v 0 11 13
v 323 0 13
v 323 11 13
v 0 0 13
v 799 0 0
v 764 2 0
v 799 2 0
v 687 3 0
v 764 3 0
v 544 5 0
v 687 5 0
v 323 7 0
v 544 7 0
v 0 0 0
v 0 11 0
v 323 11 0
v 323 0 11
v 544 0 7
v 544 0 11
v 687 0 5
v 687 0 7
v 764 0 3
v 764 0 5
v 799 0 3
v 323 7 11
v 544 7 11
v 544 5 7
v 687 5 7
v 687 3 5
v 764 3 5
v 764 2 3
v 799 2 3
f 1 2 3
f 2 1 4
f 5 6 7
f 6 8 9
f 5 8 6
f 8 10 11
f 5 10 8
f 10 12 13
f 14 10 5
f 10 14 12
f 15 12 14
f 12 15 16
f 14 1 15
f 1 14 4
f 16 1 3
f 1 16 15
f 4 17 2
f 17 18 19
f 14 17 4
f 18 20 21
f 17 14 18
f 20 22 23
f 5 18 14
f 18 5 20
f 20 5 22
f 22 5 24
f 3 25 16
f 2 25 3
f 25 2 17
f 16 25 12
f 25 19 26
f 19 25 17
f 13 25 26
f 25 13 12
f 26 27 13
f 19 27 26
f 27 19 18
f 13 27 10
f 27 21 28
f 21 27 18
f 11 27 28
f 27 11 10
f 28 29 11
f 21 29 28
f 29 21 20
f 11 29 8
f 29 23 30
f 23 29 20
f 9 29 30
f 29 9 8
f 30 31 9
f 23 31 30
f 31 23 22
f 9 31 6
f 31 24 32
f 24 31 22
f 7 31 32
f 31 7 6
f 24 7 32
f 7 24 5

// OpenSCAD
translate([8.5, 5.5, 6.5]) color([0.9418620991403894, 0.4813304127593788, 0.14090487727396894]) cube([17, 11, 13], center=true);
translate([25.5, 5.5, 6.5]) color([0.8899614875266342, 0.6019667067914363, 0.08161964024263468]) cube([17, 11, 13], center=true);
translate([42.5, 5.5, 6.5]) color([0.6986964058233333, 0.8102884962164306, 0.3527718366022422]) cube([17, 11, 13], center=true);
translate([59.5, 5.5, 6.5]) color([0.03517979094215373, 0.4662789582213983, 0.458882332198567]) cube([17, 11, 13], center=true);
translate([76.5, 5.5, 6.5]) color([0.10148050986892876, 0.7781483542276006, 0.02022807324279441]) cube([17, 11, 13], center=true);
translate([93.5, 5.5, 6.5]) color([0.5983002604350479, 0.13270195297871745, 0.3239113547302247]) cube([17, 11, 13], center=true);
translate([110.5, 5.5, 6.5]) color([0.7000796910311562, 0.6489922579129634, 0.19497362064878687]) cube([17, 11, 13], center=true);
translate([127.5, 5.5, 6.5]) color([0.7834169698984913, 0.7774609885388588, 0.11099692345616674]) cube([17, 11, 13], center=true);
translate([144.5, 5.5, 6.5]) color([0.060160827712116616, 0.7008174245595068, 0.6143308403515266]) cube([17, 11, 13], center=true);
translate([161.5, 5.5, 6.5]) color([0.9339155207415325, 0.6504721799814983, 0.9694854220936419]) cube([17, 11, 13], center=true);
translate([178.5, 5.5, 6.5]) color([0.7136168898793864, 0.2963863893491513, 0.8491315553121948]) cube([17, 11, 13], center=true);
translate([195.5, 5.5, 6.5]) color([0.95846907728749, 0.38764569013819994, 0.29380353478258403]) cube([17, 11, 13], center=true);
translate([212.5, 5.5, 6.5]) color([0.7457841029207014, 0.9575468650535228, 0.98339807845839]) cube([17, 11, 13], center=true);
translate([229.5, 5.5, 6.5]) color([0.12155240415787172, 0.8604321836344089, 0.9958411320233901]) cube([17, 11, 13], center=true);
translate([246.5, 5.5, 6.5]) color([0.03818441020037311, 0.39202639046743215, 0.3715816420064585]) cube([17, 11, 13], center=true);
translate([263.5, 5.5, 6.5]) color([0.19047756087385292, 0.3565538137373233, 0.6320134108911423]) cube([17, 11, 13], center=true);
translate([280.5, 5.5, 6.5]) color([0.9564975354421206, 0.901927522825372, 0.039980675922074105]) cube([17, 11, 13], center=true);
translate([297.5, 5.5, 6.5]) color([0.2553863294502452, 0.02665600139486224, 0.5200631817170318]) cube([17, 11, 13], center=true);
translate([314.5, 5.5, 6.5]) color([0.5692567569896342, 0.8758772851227178, 0.2296552367022351]) cube([17, 11, 13], center=true);
translate([329.5, 3.5, 5.5]) color([0.7763426439418957, 0.8846860519705121, 0.6274277551427163]) cube([13, 7, 11], center=true);
translate([342.5, 3.5, 5.5]) color([0.5024128608294012, 0.5237115354844265, 0.5071067236759631]) cube([13, 7, 11], center=true);
translate([355.5, 3.5, 5.5]) color([0.9454855480301745, 0.14569042195357562, 0.8918421087116969]) cube([13, 7, 11], center=true);
translate([368.5, 3.5, 5.5]) color([0.42205651792049836, 0.08403205823715598, 0.1047646210762947]) cube([13, 7, 11], center=true);
translate([381.5, 3.5, 5.5]) color([0.06292282863863541, 0.4151614515022839, 0.15615697007089357]) cube([13, 7, 11], center=true);
translate([394.5, 3.5, 5.5]) color([0.9545538427732947, 0.7913428503775491, 0.43108631436838285]) cube([13, 7, 11], center=true);
translate([407.5, 3.5, 5.5]) color([0.41701950900356644, 0.4966247746294912, 0.86405767472269]) cube([13, 7, 11], center=true);
translate([420.5, 3.5, 5.5]) color([0.32449912818180593, 0.25258592574699623, 0.35250302456564797]) cube([13, 7, 11], center=true);
translate([433.5, 3.5, 5.5]) color([0.12137799977699892, 0.691775150815975, 0.34544510653523897]) cube([13, 7, 11], center=true);
translate([446.5, 3.5, 5.5]) color([0.17790766067776254, 0.830270051764872, 0.23049353673314077]) cube([13, 7, 11], center=true);
translate([459.5, 3.5, 5.5]) color([0.3658024748453319, 0.5965890354919068, 0.14329113966210216]) cube([13, 7, 11], center=true);
translate([472.5, 3.5, 5.5]) color([0.003232100641658797, 0.6590184917581017, 0.7321014772226084]) cube([13, 7, 11], center=true);
translate([485.5, 3.5, 5.5]) color([0.9009039411186286, 0.7479768172441763, 0.29326295382626455]) cube([13, 7, 11], center=true);
translate([498.5, 3.5, 5.5]) color([0.6894664766240866, 0.932788033819558, 0.23286310478430694]) cube([13, 7, 11], center=true);
translate([511.5, 3.5, 5.5]) color([0.14188743522012004, 0.4540480681686925, 0.4766939084563374]) cube([13, 7, 11], center=true);
translate([524.5, 3.5, 5.5]) color([0.7074804824528956, 0.2582188407343454, 0.027936242271358158]) cube([13, 7, 11], center=true);
translate([537.5, 3.5, 5.5]) color([0.20812012525081536, 0.33501316214628807, 0.9609071038114427]) cube([13, 7, 11], center=true);
translate([549.5, 2.5, 3.5]) color([0.29634664160852753, 0.8784103092413238, 0.5532045188241876]) cube([11, 5, 7], center=true);
translate([560.5, 2.5, 3.5]) color([0.32698413866792275, 0.5930193960141523, 0.08080901281968078]) cube([11, 5, 7], center=true);
translate([571.5, 2.5, 3.5]) color([0.5332278801564081, 0.30776249733867533, 0.3765889324074634]) cube([11, 5, 7], center=true);
translate([582.5, 2.5, 3.5]) color([0.14692685712634312, 0.1252359956830017, 0.2228174233130471]) cube([11, 5, 7], center=true);
translate([593.5, 2.5, 3.5]) color([0.5083324480268261, 0.23665719296677712, 0.18394442119493715]) cube([11, 5, 7], center=true);
translate([604.5, 2.5, 3.5]) color([0.3724619255943996, 0.6631955135334705, 0.8609746033864751]) cube([11, 5, 7], center=true);
translate([615.5, 2.5, 3.5]) color([0.6012082175951422, 0.3938011681878649, 0.7021695231885549]) cube([11, 5, 7], center=true);
translate([626.5, 2.5, 3.5]) color([0.13202027544551864, 0.29938666187805807, 0.4167493264442593]) cube([11, 5, 7], center=true);
translate([637.5, 2.5, 3.5]) color([0.9263964007964989, 0.5910765187605377, 0.2980281087530109]) cube([11, 5, 7], center=true);
translate([648.5, 2.5, 3.5]) color([0.35456411603507165, 0.24805850121983253, 0.6327789974902275]) cube([11, 5, 7], center=true);
translate([659.5, 2.5, 3.5]) color([0.6370445113549524, 0.5292072971005523, 0.376431751315491]) cube([11, 5, 7], center=true);
translate([670.5, 2.5, 3.5]) color([0.008427608141492793, 0.9619565585865117, 0.901262330417864]) cube([11, 5, 7], center=true);
translate([681.5, 2.5, 3.5]) color([0.44129738363616366, 0.3715965769686672, 0.9523409342086877]) cube([11, 5, 7], center=true);
translate([690.5, 1.5, 2.5]) color([0.09105648808381206, 0.18545820412424963, 0.10861526636012075]) cube([7, 3, 5], center=true);
translate([697.5, 1.5, 2.5]) color([0.11215874223546374, 0.6055458611860893, 0.15387883630139487]) cube([7, 3, 5], center=true);
translate([704.5, 1.5, 2.5]) color([0.7025980908137885, 0.928268212070889, 0.18538068806857422]) cube([7, 3, 5], center=true);
translate([711.5, 1.5, 2.5]) color([0.42170431041506296, 0.1747372019883816, 0.9595322940755414]) cube([7, 3, 5], center=true);
translate([718.5, 1.5, 2.5]) color([0.3403879026852894, 0.5233486454380116, 0.35536744790103547]) cube([7, 3, 5], center=true);
translate([725.5, 1.5, 2.5]) color([0.6315169232882821, 0.08649939658707362, 0.7550350740823142]) cube([7, 3, 5], center=true);
translate([732.5, 1.5, 2.5]) color([0.2947283238309857, 0.8301737658604361, 0.4490883769000732]) cube([7, 3, 5], center=true);
translate([739.5, 1.5, 2.5]) color([0.4620108455998946, 0.2187341846418389, 0.11445722556586746]) cube([7, 3, 5], center=true);
translate([746.5, 1.5, 2.5]) color([0.9788025142917065, 0.3011589686960586, 0.6091605287508749]) cube([7, 3, 5], center=true);
translate([753.5, 1.5, 2.5]) color([0.4242090709976407, 0.7513524999576429, 0.09255304692818778]) cube([7, 3, 5], center=true);
translate([760.5, 1.5, 2.5]) color([0.4976795968420046, 0.9609180855182016, 0.5437408220916614]) cube([7, 3, 5], center=true);
translate([766.5, 1.0, 1.5]) color([0.405305104554358, 0.6320656015278037, 0.0216193804206819]) cube([5, 2, 3], center=true);
translate([771.5, 1.0, 1.5]) color([0.2700784048715086, 0.6684886667173141, 0.0002532098932251925]) cube([5, 2, 3], center=true);
translate([776.5, 1.0, 1.5]) color([0.3984286079265319, 0.8905618085087551, 0.7099647178965433]) cube([5, 2, 3], center=true);
translate([781.5, 1.0, 1.5]) color([0.4445845492335537, 0.7465509493098265, 0.35382203223851694]) cube([5, 2, 3], center=true);
translate([786.5, 1.0, 1.5]) color([0.8712980207444939, 0.6725473918674463, 0.19603088941730495]) cube([5, 2, 3], center=true);
translate([791.5, 1.0, 1.5]) color([0.08525923665948931, 0.0704556688087915, 0.26248678792717994]) cube([5, 2, 3], center=true);
translate([796.5, 1.0, 1.5]) color([0.533638651221174, 0.11818482376773232, 0.8594532404023933]) cube([5, 2, 3], center=true);
